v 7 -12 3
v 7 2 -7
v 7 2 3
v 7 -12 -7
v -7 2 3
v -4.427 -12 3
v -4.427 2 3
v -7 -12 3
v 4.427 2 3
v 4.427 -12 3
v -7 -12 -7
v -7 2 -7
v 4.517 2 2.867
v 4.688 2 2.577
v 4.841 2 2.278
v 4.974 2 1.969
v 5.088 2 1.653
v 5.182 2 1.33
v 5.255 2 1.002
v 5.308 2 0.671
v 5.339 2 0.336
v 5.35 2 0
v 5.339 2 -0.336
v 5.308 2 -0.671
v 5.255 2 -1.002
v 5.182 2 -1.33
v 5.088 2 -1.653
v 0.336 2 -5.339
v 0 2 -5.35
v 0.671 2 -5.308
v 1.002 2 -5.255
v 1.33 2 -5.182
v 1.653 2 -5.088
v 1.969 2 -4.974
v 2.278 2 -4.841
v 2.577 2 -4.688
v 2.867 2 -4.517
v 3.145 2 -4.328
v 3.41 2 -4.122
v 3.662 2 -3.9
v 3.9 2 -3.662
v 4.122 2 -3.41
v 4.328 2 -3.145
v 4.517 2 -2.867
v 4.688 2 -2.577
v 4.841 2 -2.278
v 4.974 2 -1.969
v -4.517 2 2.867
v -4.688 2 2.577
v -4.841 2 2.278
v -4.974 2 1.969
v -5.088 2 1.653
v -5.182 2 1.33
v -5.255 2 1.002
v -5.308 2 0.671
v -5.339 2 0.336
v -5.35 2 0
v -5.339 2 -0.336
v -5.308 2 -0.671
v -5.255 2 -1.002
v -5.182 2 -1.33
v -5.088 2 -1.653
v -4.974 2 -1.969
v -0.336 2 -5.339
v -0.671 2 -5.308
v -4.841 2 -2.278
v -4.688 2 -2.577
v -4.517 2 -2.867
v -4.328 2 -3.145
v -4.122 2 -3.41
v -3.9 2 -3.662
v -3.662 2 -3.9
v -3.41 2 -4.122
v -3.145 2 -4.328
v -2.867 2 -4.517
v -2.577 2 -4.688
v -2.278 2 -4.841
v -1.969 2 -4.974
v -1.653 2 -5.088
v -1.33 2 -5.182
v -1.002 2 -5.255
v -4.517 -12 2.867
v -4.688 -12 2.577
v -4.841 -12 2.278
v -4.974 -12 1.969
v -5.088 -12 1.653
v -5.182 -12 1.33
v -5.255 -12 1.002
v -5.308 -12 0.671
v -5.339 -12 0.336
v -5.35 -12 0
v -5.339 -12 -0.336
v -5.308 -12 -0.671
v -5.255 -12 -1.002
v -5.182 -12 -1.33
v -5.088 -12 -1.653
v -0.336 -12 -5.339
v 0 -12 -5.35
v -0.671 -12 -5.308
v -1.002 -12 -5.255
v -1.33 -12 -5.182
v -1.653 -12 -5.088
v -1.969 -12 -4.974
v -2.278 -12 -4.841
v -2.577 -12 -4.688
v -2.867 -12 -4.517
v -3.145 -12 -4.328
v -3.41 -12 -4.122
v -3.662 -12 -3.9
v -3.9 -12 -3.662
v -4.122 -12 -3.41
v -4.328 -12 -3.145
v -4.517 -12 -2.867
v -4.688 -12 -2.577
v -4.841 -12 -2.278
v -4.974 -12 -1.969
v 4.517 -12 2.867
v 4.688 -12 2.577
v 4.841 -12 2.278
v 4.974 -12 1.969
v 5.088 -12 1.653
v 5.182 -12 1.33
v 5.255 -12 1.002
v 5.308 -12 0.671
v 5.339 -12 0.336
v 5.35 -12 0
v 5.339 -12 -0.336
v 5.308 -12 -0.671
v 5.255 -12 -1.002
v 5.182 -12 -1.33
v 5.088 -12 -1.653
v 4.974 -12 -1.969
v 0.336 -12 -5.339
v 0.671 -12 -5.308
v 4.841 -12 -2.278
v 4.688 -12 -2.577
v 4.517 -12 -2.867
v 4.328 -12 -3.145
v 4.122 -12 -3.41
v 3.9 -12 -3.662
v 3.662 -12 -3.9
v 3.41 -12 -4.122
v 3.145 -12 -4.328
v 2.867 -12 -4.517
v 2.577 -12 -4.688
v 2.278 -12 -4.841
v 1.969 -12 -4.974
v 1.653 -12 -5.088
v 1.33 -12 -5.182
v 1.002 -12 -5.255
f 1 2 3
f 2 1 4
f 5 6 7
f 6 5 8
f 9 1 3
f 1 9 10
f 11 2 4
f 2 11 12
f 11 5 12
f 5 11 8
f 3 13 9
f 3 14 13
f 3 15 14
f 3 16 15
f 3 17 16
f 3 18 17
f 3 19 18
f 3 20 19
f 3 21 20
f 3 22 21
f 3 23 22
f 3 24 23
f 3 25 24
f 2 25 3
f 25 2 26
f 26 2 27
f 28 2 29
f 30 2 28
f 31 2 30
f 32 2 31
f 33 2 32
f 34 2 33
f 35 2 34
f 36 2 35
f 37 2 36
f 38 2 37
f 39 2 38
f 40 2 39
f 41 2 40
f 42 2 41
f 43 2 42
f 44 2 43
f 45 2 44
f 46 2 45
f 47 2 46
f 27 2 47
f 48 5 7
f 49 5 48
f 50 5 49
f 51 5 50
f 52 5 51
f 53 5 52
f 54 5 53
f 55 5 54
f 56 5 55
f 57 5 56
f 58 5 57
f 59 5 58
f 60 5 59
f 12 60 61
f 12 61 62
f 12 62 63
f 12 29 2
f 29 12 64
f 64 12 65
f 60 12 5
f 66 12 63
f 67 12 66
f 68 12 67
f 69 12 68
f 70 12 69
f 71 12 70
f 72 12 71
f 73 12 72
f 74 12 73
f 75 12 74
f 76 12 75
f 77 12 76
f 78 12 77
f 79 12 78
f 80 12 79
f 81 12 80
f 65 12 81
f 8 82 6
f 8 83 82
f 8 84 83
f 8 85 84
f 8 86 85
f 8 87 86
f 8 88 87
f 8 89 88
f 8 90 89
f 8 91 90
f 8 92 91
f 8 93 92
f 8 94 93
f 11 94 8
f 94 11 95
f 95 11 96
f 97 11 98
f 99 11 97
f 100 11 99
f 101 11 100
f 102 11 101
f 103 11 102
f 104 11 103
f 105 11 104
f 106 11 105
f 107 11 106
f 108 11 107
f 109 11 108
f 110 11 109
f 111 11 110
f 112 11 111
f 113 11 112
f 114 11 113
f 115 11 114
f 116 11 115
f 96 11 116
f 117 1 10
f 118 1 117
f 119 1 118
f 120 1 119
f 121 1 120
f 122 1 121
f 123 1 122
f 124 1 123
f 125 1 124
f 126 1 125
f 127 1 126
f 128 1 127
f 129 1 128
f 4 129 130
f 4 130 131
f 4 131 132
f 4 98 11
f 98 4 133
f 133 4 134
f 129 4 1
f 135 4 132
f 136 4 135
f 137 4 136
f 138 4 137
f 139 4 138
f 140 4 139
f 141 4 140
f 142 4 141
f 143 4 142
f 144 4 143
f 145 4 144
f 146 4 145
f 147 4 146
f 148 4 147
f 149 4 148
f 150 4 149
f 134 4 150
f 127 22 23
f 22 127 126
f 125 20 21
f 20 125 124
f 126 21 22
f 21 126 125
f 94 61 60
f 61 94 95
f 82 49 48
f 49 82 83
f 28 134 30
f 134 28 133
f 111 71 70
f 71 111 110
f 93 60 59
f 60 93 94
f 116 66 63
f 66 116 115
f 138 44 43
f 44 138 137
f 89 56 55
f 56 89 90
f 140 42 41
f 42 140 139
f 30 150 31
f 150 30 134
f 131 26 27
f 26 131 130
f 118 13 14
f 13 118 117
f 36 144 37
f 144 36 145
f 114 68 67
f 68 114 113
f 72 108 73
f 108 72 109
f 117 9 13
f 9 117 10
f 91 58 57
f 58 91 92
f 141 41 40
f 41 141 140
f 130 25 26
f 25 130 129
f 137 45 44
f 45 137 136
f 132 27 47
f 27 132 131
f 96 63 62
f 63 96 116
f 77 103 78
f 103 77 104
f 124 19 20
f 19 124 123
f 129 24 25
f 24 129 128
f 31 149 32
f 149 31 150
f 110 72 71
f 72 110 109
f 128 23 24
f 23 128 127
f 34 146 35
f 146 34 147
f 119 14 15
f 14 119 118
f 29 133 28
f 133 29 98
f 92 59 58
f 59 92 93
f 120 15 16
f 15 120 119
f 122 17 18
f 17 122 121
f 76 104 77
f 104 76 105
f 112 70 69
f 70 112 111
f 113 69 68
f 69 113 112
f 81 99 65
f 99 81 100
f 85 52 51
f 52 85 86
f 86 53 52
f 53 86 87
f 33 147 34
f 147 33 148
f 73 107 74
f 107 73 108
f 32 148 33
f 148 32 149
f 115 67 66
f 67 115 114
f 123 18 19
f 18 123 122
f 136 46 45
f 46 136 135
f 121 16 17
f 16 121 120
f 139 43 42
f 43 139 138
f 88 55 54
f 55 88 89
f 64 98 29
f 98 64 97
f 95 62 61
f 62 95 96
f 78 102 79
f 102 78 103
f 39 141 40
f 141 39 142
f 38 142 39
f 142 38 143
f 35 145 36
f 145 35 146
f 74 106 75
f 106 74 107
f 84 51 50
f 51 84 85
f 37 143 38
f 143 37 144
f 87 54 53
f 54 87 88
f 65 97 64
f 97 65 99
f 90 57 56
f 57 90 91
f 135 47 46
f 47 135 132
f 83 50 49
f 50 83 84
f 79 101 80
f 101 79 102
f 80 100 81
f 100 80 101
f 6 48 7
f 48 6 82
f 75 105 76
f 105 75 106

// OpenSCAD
$fn=100;

difference(){
    translate([0, -5, -2])
    cube(size = [14, 14, 10], center = true);
    rotate([90, 0, 0])
    translate([0, 0, -3])
    cylinder(h = 30, d = 10.7);
}
